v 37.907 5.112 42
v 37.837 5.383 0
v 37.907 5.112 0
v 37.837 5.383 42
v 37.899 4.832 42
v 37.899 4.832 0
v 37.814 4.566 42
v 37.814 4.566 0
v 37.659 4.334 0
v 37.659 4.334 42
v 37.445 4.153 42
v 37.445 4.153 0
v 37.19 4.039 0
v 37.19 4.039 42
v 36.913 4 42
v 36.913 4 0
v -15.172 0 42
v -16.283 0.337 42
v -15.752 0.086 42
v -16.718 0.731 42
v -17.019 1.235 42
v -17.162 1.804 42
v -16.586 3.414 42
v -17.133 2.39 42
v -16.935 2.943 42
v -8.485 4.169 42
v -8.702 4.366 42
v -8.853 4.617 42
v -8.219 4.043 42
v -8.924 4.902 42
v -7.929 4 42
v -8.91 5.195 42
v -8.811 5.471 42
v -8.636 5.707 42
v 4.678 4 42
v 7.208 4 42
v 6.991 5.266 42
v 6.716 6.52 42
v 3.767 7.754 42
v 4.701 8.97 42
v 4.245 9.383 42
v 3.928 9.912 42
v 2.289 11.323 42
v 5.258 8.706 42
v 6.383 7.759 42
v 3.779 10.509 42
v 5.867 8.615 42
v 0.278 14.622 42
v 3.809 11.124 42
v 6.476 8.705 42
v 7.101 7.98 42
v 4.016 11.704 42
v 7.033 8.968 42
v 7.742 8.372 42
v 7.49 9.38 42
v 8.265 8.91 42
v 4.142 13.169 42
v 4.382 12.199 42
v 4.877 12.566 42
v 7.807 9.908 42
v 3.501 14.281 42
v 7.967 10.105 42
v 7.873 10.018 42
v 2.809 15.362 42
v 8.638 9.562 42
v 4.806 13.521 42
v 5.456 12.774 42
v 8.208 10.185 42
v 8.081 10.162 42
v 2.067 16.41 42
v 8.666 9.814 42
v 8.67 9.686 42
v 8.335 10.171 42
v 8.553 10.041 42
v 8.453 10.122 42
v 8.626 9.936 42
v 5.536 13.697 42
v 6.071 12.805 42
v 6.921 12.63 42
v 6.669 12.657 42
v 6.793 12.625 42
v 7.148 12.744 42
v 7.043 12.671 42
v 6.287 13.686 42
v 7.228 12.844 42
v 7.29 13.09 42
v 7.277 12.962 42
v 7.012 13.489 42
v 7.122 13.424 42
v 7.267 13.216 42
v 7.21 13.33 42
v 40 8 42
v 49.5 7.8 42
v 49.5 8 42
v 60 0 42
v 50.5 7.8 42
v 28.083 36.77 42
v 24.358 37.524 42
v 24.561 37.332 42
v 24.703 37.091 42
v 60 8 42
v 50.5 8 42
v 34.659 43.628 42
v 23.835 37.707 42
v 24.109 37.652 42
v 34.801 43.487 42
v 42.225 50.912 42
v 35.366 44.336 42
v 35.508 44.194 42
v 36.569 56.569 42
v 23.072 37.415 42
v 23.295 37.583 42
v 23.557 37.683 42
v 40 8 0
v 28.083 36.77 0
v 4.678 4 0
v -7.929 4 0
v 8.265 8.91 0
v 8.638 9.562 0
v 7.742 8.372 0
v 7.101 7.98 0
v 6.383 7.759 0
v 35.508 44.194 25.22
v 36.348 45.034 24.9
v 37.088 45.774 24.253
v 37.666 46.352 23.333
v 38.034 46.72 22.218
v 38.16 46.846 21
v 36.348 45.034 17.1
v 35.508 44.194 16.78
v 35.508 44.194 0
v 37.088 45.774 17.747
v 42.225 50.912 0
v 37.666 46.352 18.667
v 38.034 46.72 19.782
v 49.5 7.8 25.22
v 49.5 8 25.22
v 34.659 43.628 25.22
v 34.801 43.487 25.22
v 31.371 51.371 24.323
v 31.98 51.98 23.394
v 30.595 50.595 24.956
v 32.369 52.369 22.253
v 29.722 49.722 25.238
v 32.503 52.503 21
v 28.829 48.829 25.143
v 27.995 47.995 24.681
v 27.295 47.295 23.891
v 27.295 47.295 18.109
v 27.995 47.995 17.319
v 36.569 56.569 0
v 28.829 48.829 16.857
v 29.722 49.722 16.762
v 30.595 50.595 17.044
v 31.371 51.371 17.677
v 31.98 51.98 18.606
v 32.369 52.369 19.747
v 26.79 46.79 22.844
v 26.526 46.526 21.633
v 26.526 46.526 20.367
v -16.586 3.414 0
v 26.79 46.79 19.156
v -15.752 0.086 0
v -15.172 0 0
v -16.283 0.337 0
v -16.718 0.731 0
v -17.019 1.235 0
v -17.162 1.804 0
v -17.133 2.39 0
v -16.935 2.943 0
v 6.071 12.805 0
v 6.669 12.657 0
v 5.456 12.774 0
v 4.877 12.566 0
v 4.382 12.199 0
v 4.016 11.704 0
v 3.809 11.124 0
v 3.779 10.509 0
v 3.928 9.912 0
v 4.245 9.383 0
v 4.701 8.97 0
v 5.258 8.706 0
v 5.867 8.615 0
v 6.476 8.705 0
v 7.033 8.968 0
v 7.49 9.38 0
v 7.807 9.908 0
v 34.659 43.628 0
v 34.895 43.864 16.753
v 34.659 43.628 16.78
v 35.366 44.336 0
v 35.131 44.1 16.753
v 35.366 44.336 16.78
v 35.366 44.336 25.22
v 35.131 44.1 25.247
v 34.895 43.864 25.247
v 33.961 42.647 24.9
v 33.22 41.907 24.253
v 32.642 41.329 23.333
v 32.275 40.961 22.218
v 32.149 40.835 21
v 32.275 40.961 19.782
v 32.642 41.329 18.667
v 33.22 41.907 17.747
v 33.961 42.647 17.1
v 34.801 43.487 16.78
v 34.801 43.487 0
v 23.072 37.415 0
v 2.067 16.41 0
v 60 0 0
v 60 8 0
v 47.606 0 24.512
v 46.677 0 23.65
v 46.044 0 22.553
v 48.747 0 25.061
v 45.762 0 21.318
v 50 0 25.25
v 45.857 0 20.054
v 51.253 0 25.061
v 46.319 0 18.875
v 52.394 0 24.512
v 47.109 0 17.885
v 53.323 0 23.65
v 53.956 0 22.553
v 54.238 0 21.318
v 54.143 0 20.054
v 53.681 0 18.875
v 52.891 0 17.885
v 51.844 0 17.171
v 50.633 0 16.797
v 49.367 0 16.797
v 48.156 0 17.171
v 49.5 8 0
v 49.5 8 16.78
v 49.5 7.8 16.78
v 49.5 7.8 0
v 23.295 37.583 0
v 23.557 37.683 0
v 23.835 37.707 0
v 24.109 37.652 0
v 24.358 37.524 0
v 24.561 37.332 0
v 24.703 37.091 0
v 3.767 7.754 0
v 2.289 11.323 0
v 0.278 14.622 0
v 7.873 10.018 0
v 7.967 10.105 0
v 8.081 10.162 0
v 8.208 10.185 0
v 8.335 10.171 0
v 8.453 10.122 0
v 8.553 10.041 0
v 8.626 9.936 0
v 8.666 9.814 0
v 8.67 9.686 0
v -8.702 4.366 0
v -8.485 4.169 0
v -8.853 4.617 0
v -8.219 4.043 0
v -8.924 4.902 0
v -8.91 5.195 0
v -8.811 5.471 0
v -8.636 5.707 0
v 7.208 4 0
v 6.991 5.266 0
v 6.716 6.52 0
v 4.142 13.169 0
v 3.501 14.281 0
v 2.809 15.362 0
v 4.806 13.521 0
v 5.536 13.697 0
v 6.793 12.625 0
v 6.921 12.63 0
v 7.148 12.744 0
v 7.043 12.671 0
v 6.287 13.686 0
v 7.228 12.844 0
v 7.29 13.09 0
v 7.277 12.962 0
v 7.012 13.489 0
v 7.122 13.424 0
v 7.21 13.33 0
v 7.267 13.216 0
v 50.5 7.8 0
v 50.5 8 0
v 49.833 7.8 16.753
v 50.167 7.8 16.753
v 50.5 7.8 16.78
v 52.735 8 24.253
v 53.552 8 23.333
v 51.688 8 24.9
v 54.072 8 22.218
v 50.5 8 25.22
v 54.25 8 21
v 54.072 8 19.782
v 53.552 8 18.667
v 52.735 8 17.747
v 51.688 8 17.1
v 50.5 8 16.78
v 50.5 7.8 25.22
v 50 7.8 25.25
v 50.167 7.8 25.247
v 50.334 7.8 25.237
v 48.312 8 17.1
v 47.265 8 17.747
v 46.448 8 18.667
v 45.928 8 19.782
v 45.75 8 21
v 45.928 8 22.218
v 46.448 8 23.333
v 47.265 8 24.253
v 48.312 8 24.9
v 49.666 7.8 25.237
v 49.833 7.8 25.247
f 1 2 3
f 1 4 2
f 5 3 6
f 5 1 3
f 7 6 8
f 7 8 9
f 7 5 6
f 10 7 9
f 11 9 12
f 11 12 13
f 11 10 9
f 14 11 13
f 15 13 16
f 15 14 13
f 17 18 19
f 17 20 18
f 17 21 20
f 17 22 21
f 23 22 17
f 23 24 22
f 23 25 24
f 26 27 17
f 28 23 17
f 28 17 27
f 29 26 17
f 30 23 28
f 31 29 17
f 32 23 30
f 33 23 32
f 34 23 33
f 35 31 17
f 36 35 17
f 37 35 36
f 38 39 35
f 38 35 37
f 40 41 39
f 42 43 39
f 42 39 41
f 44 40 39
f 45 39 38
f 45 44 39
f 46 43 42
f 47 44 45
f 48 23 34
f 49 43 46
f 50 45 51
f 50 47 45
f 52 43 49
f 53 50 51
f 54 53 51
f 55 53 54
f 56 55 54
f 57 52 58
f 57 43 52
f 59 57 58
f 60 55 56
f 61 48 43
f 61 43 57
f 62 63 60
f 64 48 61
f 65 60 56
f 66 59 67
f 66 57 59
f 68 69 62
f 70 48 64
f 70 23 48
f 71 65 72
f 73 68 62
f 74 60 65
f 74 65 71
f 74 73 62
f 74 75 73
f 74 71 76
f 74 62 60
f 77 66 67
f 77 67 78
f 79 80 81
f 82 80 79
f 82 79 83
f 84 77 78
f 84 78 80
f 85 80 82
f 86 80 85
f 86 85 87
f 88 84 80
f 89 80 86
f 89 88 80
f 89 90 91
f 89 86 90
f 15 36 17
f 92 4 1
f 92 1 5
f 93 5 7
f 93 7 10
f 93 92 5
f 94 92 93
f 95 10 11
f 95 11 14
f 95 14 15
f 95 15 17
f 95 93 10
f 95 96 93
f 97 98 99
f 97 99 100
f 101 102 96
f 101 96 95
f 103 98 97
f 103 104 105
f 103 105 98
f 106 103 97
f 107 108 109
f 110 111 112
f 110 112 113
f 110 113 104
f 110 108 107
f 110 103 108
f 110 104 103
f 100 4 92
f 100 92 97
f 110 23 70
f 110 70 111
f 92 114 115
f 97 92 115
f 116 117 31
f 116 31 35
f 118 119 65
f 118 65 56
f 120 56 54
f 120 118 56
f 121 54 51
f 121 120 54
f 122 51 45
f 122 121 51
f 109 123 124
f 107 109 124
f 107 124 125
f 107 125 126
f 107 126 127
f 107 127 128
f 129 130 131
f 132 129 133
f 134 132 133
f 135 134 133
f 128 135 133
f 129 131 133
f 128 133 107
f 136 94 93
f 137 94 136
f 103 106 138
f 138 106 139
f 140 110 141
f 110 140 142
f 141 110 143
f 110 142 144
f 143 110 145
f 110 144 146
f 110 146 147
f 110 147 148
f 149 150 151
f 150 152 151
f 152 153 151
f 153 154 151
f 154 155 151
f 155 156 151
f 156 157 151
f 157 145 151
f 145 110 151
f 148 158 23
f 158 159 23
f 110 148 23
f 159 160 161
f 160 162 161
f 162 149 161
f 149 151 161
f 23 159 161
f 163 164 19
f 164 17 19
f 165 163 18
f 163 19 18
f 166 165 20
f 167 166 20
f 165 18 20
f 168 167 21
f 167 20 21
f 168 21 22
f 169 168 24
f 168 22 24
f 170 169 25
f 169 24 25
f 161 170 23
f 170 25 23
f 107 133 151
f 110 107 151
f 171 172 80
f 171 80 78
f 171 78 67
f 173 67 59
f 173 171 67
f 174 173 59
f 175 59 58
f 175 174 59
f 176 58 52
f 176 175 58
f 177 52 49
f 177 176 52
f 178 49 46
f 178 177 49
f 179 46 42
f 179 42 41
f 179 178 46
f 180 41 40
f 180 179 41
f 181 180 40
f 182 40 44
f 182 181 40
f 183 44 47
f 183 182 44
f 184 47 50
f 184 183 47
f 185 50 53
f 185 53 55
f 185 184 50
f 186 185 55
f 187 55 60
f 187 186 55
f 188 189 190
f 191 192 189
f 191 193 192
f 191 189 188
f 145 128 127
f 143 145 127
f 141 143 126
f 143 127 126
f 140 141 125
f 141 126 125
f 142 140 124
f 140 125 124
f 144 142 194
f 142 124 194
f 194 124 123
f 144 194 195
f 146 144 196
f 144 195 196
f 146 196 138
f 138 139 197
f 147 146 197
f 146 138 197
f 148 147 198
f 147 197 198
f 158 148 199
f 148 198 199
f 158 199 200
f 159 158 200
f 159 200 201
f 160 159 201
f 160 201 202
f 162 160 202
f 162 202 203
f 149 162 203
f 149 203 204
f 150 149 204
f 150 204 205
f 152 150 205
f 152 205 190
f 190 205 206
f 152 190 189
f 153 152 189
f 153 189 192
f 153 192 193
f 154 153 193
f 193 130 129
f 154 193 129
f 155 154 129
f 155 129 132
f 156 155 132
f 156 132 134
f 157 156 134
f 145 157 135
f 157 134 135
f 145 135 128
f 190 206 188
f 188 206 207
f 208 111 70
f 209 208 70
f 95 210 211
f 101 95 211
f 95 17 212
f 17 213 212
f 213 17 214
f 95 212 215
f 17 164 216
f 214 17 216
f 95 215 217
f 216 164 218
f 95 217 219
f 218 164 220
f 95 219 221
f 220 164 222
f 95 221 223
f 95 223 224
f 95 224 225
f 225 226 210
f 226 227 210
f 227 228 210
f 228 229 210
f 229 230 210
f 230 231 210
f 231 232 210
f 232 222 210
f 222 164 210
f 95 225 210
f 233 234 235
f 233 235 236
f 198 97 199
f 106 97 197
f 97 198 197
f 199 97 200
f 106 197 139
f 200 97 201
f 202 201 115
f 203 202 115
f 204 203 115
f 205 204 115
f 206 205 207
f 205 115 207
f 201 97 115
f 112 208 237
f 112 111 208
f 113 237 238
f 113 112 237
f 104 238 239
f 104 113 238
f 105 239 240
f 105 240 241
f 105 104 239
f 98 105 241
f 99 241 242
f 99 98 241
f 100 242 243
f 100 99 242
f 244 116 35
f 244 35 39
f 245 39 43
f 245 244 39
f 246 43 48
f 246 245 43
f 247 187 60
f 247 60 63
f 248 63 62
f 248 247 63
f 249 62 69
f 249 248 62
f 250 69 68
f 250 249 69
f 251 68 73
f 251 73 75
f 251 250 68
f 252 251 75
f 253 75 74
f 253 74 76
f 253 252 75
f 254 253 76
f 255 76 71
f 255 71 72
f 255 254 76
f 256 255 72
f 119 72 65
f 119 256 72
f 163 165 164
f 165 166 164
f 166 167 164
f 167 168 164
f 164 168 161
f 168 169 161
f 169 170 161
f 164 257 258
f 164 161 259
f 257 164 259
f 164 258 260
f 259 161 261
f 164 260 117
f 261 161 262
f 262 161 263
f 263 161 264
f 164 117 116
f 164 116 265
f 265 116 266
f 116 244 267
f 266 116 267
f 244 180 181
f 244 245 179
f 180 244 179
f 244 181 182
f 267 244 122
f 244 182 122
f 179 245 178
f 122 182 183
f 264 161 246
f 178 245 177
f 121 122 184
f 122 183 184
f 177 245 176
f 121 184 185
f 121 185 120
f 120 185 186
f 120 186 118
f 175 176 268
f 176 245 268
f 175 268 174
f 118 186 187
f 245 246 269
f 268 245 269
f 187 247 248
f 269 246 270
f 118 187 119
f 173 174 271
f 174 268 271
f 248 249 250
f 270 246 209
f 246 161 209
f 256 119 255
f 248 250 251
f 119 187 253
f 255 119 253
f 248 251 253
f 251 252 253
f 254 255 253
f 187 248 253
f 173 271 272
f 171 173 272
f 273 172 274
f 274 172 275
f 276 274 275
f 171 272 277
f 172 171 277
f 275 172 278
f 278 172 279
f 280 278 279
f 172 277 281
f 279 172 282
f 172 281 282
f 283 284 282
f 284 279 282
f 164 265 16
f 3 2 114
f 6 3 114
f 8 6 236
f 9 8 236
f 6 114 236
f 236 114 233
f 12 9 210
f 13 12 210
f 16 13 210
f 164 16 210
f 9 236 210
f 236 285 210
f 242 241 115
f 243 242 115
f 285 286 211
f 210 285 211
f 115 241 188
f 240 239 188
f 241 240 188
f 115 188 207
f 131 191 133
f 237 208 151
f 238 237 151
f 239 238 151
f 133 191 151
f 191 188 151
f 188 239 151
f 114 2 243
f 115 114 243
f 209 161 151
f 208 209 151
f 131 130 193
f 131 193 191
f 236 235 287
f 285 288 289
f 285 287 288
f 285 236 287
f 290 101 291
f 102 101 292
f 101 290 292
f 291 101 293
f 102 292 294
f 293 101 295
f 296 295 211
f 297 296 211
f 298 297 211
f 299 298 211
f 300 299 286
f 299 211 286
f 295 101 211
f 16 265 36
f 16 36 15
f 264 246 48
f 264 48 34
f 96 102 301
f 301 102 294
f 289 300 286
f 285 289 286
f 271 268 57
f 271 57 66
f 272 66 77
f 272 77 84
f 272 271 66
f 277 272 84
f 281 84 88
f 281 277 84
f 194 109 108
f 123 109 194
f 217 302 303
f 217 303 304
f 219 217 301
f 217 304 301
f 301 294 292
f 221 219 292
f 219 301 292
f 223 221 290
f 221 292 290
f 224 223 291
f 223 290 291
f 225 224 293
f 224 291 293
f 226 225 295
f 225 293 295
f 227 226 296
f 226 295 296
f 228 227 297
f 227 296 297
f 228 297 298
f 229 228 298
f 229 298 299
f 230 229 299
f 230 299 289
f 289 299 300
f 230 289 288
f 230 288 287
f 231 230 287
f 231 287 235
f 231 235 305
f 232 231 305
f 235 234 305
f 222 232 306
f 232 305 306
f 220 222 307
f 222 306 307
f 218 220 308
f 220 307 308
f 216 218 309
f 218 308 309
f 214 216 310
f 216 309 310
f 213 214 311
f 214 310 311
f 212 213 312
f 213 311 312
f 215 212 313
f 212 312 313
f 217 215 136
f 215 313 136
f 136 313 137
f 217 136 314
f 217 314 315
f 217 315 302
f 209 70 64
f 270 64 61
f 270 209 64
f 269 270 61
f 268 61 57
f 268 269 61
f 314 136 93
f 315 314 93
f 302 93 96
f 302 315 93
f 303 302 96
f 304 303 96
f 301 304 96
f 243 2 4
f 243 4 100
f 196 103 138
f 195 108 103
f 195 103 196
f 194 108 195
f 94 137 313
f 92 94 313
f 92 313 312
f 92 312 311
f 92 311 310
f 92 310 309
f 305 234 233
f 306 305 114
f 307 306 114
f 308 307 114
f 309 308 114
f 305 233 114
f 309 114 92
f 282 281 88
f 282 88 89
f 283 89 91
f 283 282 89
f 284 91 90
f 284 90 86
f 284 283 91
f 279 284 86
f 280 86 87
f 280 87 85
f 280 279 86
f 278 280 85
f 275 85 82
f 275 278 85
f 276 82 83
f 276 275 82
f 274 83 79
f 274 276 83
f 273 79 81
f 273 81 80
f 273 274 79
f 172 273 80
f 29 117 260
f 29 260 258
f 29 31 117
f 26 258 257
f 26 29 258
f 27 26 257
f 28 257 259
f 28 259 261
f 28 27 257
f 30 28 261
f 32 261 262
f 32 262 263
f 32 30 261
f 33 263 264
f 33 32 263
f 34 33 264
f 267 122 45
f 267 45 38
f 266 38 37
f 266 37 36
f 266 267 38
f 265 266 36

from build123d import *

# Parameters (mm, degrees)
EXTRUDE_1_DEPTH     = 42
FILLET_1_R          = 2
FILLET_2_R          = 1
FILLET_3_R          = 1
CUT_EXTRUDE_1_REACH = 89.88
SKETCH_2_R          = 4.25
CUT_EXTRUDE_2_REACH = 94.906
SKETCH_3_R          = 4.25
SKETCH_4_W          = 42
SKETCH_4_H          = 1
CUT_EXTRUDE_3_DEPTH = 0.2
SKETCH_5_W          = 1
SKETCH_5_H          = 42
CUT_EXTRUDE_4_DEPTH = 0.2


with BuildPart() as part:
    # 草图1 → 凸台-拉伸1 (new body)
    with BuildSketch(Plane.XY):
        Polygon((0, 0), (60, 0), (60, 8), (40, 8), (28.083261121, 36.769552622), (42.225396744, 50.911688245), (36.568542495, 56.568542495), (-20, 0), align=None)
        with BuildLine():
            Line((24.130306277, 38.473452028), (2.067060132, 16.410205883))
            ThreePointArc((2.067060132, 16.410205883), (3.161356319, 14.825706508), (4.142085372, 13.168512212))
            ThreePointArc((4.142085372, 13.168512212), (5.535917687, 13.696629788), (7.01188026, 13.488756805))
            ThreePointArc((7.01188026, 13.488756805), (7.256435362, 12.901225698), (6.668904255, 12.656670595))
            ThreePointArc((6.668904255, 12.656670595), (3.928479892, 9.911500898), (7.80738065, 9.90814544))
            ThreePointArc((7.80738065, 9.90814544), (8.395754452, 10.150666099), (8.638275111, 9.562292298))
            ThreePointArc((8.638275111, 9.562292298), (7.741600362, 8.371640758), (6.382576562, 7.759487995))
            ThreePointArc((6.382576562, 7.759487995), (6.860909722, 5.894194507), (7.207535721, 4))
            Line((7.207535721, 4), (38.409677649, 4))
            Line((38.409677649, 4), (24.130306277, 38.473452028))
        make_face(mode=Mode.SUBTRACT)
        with BuildLine():
            Line((-10.343145751, 4), (4.677925359, 4))
            ThreePointArc((4.677925359, 4), (3.096988313, 9.567085809), (0.278355491, 14.621501242))
            Line((0.278355491, 14.621501242), (-10.343145751, 4))
        make_face(mode=Mode.SUBTRACT)
    extrude(amount=EXTRUDE_1_DEPTH)

    # 圆角1
    fillet_1_edges = [part.edges().sort_by_distance(p)[0] for p in [
        (-20, 0, 21),
    ]]
    fillet(fillet_1_edges, radius=FILLET_1_R)

    # 圆角2
    fillet_2_edges = [part.edges().sort_by_distance(p)[0] for p in [
        (-10.343145751, 4, 21),
    ]]
    fillet(fillet_2_edges, radius=FILLET_2_R)

    # 圆角3
    fillet_3_edges = [part.edges().sort_by_distance(p)[0] for p in [
        (38.409677649, 4, 21),
        (24.130306277, 38.473452028, 21),
    ]]
    fillet(fillet_3_edges, radius=FILLET_3_R)

    # 草图2 → 切除-拉伸1 (cut, up to next)
    with BuildSketch(Plane(origin=(0, 8, 0), x_dir=(1, 0, 0), z_dir=(0, 1, 0)), mode=Mode.PRIVATE) as cut_extrude_1_sk1:
        with Locations(Location((50, -21, 0), (0, 0, 270))):
            Circle(SKETCH_2_R)
    cut_extrude_1_tool1 = extrude(cut_extrude_1_sk1.sketch, amount=-CUT_EXTRUDE_1_REACH, mode=Mode.PRIVATE) & part.part
    add(cut_extrude_1_tool1.solids().sort_by_distance((50, 8, 21))[0], mode=Mode.SUBTRACT)

    # 草图3 → 切除-拉伸2 (cut, up to next)
    with BuildSketch(Plane(origin=(-4.343145751, 4.343145751, 0), x_dir=(0, 0, -1), z_dir=(0.7071067811865441, -0.7071067811865509, 0)), mode=Mode.PRIVATE) as cut_extrude_2_sk1:
        with Locations(Location((-21, 55.857864376, 0), (0, 0, 90))):
            Circle(SKETCH_3_R)
    cut_extrude_2_tool1 = extrude(cut_extrude_2_sk1.sketch, amount=-CUT_EXTRUDE_2_REACH, mode=Mode.PRIVATE) & part.part
    add(cut_extrude_2_tool1.solids().sort_by_distance((35.154329, 43.84062, 21))[0], mode=Mode.SUBTRACT)

    # 草图4 → 切除-拉伸3 (cut)
    with BuildSketch(Plane(origin=(-4.343145751, 4.343145751, 0), x_dir=(0, 0, -1), z_dir=(0.7071067811865441, -0.7071067811865509, 0))):
        with Locations((-21, 55.857864376)):
            Rectangle(SKETCH_4_W, SKETCH_4_H)
    extrude(amount=-CUT_EXTRUDE_3_DEPTH, mode=Mode.SUBTRACT)

    # 草图5 → 切除-拉伸4 (cut)
    with BuildSketch(Plane(origin=(0, 8, 0), x_dir=(1, 0, 0), z_dir=(0, 1, 0))):
        with Locations((50, -21)):
            Rectangle(SKETCH_5_W, SKETCH_5_H)
    extrude(amount=-CUT_EXTRUDE_4_DEPTH, mode=Mode.SUBTRACT)


solid = part.part
